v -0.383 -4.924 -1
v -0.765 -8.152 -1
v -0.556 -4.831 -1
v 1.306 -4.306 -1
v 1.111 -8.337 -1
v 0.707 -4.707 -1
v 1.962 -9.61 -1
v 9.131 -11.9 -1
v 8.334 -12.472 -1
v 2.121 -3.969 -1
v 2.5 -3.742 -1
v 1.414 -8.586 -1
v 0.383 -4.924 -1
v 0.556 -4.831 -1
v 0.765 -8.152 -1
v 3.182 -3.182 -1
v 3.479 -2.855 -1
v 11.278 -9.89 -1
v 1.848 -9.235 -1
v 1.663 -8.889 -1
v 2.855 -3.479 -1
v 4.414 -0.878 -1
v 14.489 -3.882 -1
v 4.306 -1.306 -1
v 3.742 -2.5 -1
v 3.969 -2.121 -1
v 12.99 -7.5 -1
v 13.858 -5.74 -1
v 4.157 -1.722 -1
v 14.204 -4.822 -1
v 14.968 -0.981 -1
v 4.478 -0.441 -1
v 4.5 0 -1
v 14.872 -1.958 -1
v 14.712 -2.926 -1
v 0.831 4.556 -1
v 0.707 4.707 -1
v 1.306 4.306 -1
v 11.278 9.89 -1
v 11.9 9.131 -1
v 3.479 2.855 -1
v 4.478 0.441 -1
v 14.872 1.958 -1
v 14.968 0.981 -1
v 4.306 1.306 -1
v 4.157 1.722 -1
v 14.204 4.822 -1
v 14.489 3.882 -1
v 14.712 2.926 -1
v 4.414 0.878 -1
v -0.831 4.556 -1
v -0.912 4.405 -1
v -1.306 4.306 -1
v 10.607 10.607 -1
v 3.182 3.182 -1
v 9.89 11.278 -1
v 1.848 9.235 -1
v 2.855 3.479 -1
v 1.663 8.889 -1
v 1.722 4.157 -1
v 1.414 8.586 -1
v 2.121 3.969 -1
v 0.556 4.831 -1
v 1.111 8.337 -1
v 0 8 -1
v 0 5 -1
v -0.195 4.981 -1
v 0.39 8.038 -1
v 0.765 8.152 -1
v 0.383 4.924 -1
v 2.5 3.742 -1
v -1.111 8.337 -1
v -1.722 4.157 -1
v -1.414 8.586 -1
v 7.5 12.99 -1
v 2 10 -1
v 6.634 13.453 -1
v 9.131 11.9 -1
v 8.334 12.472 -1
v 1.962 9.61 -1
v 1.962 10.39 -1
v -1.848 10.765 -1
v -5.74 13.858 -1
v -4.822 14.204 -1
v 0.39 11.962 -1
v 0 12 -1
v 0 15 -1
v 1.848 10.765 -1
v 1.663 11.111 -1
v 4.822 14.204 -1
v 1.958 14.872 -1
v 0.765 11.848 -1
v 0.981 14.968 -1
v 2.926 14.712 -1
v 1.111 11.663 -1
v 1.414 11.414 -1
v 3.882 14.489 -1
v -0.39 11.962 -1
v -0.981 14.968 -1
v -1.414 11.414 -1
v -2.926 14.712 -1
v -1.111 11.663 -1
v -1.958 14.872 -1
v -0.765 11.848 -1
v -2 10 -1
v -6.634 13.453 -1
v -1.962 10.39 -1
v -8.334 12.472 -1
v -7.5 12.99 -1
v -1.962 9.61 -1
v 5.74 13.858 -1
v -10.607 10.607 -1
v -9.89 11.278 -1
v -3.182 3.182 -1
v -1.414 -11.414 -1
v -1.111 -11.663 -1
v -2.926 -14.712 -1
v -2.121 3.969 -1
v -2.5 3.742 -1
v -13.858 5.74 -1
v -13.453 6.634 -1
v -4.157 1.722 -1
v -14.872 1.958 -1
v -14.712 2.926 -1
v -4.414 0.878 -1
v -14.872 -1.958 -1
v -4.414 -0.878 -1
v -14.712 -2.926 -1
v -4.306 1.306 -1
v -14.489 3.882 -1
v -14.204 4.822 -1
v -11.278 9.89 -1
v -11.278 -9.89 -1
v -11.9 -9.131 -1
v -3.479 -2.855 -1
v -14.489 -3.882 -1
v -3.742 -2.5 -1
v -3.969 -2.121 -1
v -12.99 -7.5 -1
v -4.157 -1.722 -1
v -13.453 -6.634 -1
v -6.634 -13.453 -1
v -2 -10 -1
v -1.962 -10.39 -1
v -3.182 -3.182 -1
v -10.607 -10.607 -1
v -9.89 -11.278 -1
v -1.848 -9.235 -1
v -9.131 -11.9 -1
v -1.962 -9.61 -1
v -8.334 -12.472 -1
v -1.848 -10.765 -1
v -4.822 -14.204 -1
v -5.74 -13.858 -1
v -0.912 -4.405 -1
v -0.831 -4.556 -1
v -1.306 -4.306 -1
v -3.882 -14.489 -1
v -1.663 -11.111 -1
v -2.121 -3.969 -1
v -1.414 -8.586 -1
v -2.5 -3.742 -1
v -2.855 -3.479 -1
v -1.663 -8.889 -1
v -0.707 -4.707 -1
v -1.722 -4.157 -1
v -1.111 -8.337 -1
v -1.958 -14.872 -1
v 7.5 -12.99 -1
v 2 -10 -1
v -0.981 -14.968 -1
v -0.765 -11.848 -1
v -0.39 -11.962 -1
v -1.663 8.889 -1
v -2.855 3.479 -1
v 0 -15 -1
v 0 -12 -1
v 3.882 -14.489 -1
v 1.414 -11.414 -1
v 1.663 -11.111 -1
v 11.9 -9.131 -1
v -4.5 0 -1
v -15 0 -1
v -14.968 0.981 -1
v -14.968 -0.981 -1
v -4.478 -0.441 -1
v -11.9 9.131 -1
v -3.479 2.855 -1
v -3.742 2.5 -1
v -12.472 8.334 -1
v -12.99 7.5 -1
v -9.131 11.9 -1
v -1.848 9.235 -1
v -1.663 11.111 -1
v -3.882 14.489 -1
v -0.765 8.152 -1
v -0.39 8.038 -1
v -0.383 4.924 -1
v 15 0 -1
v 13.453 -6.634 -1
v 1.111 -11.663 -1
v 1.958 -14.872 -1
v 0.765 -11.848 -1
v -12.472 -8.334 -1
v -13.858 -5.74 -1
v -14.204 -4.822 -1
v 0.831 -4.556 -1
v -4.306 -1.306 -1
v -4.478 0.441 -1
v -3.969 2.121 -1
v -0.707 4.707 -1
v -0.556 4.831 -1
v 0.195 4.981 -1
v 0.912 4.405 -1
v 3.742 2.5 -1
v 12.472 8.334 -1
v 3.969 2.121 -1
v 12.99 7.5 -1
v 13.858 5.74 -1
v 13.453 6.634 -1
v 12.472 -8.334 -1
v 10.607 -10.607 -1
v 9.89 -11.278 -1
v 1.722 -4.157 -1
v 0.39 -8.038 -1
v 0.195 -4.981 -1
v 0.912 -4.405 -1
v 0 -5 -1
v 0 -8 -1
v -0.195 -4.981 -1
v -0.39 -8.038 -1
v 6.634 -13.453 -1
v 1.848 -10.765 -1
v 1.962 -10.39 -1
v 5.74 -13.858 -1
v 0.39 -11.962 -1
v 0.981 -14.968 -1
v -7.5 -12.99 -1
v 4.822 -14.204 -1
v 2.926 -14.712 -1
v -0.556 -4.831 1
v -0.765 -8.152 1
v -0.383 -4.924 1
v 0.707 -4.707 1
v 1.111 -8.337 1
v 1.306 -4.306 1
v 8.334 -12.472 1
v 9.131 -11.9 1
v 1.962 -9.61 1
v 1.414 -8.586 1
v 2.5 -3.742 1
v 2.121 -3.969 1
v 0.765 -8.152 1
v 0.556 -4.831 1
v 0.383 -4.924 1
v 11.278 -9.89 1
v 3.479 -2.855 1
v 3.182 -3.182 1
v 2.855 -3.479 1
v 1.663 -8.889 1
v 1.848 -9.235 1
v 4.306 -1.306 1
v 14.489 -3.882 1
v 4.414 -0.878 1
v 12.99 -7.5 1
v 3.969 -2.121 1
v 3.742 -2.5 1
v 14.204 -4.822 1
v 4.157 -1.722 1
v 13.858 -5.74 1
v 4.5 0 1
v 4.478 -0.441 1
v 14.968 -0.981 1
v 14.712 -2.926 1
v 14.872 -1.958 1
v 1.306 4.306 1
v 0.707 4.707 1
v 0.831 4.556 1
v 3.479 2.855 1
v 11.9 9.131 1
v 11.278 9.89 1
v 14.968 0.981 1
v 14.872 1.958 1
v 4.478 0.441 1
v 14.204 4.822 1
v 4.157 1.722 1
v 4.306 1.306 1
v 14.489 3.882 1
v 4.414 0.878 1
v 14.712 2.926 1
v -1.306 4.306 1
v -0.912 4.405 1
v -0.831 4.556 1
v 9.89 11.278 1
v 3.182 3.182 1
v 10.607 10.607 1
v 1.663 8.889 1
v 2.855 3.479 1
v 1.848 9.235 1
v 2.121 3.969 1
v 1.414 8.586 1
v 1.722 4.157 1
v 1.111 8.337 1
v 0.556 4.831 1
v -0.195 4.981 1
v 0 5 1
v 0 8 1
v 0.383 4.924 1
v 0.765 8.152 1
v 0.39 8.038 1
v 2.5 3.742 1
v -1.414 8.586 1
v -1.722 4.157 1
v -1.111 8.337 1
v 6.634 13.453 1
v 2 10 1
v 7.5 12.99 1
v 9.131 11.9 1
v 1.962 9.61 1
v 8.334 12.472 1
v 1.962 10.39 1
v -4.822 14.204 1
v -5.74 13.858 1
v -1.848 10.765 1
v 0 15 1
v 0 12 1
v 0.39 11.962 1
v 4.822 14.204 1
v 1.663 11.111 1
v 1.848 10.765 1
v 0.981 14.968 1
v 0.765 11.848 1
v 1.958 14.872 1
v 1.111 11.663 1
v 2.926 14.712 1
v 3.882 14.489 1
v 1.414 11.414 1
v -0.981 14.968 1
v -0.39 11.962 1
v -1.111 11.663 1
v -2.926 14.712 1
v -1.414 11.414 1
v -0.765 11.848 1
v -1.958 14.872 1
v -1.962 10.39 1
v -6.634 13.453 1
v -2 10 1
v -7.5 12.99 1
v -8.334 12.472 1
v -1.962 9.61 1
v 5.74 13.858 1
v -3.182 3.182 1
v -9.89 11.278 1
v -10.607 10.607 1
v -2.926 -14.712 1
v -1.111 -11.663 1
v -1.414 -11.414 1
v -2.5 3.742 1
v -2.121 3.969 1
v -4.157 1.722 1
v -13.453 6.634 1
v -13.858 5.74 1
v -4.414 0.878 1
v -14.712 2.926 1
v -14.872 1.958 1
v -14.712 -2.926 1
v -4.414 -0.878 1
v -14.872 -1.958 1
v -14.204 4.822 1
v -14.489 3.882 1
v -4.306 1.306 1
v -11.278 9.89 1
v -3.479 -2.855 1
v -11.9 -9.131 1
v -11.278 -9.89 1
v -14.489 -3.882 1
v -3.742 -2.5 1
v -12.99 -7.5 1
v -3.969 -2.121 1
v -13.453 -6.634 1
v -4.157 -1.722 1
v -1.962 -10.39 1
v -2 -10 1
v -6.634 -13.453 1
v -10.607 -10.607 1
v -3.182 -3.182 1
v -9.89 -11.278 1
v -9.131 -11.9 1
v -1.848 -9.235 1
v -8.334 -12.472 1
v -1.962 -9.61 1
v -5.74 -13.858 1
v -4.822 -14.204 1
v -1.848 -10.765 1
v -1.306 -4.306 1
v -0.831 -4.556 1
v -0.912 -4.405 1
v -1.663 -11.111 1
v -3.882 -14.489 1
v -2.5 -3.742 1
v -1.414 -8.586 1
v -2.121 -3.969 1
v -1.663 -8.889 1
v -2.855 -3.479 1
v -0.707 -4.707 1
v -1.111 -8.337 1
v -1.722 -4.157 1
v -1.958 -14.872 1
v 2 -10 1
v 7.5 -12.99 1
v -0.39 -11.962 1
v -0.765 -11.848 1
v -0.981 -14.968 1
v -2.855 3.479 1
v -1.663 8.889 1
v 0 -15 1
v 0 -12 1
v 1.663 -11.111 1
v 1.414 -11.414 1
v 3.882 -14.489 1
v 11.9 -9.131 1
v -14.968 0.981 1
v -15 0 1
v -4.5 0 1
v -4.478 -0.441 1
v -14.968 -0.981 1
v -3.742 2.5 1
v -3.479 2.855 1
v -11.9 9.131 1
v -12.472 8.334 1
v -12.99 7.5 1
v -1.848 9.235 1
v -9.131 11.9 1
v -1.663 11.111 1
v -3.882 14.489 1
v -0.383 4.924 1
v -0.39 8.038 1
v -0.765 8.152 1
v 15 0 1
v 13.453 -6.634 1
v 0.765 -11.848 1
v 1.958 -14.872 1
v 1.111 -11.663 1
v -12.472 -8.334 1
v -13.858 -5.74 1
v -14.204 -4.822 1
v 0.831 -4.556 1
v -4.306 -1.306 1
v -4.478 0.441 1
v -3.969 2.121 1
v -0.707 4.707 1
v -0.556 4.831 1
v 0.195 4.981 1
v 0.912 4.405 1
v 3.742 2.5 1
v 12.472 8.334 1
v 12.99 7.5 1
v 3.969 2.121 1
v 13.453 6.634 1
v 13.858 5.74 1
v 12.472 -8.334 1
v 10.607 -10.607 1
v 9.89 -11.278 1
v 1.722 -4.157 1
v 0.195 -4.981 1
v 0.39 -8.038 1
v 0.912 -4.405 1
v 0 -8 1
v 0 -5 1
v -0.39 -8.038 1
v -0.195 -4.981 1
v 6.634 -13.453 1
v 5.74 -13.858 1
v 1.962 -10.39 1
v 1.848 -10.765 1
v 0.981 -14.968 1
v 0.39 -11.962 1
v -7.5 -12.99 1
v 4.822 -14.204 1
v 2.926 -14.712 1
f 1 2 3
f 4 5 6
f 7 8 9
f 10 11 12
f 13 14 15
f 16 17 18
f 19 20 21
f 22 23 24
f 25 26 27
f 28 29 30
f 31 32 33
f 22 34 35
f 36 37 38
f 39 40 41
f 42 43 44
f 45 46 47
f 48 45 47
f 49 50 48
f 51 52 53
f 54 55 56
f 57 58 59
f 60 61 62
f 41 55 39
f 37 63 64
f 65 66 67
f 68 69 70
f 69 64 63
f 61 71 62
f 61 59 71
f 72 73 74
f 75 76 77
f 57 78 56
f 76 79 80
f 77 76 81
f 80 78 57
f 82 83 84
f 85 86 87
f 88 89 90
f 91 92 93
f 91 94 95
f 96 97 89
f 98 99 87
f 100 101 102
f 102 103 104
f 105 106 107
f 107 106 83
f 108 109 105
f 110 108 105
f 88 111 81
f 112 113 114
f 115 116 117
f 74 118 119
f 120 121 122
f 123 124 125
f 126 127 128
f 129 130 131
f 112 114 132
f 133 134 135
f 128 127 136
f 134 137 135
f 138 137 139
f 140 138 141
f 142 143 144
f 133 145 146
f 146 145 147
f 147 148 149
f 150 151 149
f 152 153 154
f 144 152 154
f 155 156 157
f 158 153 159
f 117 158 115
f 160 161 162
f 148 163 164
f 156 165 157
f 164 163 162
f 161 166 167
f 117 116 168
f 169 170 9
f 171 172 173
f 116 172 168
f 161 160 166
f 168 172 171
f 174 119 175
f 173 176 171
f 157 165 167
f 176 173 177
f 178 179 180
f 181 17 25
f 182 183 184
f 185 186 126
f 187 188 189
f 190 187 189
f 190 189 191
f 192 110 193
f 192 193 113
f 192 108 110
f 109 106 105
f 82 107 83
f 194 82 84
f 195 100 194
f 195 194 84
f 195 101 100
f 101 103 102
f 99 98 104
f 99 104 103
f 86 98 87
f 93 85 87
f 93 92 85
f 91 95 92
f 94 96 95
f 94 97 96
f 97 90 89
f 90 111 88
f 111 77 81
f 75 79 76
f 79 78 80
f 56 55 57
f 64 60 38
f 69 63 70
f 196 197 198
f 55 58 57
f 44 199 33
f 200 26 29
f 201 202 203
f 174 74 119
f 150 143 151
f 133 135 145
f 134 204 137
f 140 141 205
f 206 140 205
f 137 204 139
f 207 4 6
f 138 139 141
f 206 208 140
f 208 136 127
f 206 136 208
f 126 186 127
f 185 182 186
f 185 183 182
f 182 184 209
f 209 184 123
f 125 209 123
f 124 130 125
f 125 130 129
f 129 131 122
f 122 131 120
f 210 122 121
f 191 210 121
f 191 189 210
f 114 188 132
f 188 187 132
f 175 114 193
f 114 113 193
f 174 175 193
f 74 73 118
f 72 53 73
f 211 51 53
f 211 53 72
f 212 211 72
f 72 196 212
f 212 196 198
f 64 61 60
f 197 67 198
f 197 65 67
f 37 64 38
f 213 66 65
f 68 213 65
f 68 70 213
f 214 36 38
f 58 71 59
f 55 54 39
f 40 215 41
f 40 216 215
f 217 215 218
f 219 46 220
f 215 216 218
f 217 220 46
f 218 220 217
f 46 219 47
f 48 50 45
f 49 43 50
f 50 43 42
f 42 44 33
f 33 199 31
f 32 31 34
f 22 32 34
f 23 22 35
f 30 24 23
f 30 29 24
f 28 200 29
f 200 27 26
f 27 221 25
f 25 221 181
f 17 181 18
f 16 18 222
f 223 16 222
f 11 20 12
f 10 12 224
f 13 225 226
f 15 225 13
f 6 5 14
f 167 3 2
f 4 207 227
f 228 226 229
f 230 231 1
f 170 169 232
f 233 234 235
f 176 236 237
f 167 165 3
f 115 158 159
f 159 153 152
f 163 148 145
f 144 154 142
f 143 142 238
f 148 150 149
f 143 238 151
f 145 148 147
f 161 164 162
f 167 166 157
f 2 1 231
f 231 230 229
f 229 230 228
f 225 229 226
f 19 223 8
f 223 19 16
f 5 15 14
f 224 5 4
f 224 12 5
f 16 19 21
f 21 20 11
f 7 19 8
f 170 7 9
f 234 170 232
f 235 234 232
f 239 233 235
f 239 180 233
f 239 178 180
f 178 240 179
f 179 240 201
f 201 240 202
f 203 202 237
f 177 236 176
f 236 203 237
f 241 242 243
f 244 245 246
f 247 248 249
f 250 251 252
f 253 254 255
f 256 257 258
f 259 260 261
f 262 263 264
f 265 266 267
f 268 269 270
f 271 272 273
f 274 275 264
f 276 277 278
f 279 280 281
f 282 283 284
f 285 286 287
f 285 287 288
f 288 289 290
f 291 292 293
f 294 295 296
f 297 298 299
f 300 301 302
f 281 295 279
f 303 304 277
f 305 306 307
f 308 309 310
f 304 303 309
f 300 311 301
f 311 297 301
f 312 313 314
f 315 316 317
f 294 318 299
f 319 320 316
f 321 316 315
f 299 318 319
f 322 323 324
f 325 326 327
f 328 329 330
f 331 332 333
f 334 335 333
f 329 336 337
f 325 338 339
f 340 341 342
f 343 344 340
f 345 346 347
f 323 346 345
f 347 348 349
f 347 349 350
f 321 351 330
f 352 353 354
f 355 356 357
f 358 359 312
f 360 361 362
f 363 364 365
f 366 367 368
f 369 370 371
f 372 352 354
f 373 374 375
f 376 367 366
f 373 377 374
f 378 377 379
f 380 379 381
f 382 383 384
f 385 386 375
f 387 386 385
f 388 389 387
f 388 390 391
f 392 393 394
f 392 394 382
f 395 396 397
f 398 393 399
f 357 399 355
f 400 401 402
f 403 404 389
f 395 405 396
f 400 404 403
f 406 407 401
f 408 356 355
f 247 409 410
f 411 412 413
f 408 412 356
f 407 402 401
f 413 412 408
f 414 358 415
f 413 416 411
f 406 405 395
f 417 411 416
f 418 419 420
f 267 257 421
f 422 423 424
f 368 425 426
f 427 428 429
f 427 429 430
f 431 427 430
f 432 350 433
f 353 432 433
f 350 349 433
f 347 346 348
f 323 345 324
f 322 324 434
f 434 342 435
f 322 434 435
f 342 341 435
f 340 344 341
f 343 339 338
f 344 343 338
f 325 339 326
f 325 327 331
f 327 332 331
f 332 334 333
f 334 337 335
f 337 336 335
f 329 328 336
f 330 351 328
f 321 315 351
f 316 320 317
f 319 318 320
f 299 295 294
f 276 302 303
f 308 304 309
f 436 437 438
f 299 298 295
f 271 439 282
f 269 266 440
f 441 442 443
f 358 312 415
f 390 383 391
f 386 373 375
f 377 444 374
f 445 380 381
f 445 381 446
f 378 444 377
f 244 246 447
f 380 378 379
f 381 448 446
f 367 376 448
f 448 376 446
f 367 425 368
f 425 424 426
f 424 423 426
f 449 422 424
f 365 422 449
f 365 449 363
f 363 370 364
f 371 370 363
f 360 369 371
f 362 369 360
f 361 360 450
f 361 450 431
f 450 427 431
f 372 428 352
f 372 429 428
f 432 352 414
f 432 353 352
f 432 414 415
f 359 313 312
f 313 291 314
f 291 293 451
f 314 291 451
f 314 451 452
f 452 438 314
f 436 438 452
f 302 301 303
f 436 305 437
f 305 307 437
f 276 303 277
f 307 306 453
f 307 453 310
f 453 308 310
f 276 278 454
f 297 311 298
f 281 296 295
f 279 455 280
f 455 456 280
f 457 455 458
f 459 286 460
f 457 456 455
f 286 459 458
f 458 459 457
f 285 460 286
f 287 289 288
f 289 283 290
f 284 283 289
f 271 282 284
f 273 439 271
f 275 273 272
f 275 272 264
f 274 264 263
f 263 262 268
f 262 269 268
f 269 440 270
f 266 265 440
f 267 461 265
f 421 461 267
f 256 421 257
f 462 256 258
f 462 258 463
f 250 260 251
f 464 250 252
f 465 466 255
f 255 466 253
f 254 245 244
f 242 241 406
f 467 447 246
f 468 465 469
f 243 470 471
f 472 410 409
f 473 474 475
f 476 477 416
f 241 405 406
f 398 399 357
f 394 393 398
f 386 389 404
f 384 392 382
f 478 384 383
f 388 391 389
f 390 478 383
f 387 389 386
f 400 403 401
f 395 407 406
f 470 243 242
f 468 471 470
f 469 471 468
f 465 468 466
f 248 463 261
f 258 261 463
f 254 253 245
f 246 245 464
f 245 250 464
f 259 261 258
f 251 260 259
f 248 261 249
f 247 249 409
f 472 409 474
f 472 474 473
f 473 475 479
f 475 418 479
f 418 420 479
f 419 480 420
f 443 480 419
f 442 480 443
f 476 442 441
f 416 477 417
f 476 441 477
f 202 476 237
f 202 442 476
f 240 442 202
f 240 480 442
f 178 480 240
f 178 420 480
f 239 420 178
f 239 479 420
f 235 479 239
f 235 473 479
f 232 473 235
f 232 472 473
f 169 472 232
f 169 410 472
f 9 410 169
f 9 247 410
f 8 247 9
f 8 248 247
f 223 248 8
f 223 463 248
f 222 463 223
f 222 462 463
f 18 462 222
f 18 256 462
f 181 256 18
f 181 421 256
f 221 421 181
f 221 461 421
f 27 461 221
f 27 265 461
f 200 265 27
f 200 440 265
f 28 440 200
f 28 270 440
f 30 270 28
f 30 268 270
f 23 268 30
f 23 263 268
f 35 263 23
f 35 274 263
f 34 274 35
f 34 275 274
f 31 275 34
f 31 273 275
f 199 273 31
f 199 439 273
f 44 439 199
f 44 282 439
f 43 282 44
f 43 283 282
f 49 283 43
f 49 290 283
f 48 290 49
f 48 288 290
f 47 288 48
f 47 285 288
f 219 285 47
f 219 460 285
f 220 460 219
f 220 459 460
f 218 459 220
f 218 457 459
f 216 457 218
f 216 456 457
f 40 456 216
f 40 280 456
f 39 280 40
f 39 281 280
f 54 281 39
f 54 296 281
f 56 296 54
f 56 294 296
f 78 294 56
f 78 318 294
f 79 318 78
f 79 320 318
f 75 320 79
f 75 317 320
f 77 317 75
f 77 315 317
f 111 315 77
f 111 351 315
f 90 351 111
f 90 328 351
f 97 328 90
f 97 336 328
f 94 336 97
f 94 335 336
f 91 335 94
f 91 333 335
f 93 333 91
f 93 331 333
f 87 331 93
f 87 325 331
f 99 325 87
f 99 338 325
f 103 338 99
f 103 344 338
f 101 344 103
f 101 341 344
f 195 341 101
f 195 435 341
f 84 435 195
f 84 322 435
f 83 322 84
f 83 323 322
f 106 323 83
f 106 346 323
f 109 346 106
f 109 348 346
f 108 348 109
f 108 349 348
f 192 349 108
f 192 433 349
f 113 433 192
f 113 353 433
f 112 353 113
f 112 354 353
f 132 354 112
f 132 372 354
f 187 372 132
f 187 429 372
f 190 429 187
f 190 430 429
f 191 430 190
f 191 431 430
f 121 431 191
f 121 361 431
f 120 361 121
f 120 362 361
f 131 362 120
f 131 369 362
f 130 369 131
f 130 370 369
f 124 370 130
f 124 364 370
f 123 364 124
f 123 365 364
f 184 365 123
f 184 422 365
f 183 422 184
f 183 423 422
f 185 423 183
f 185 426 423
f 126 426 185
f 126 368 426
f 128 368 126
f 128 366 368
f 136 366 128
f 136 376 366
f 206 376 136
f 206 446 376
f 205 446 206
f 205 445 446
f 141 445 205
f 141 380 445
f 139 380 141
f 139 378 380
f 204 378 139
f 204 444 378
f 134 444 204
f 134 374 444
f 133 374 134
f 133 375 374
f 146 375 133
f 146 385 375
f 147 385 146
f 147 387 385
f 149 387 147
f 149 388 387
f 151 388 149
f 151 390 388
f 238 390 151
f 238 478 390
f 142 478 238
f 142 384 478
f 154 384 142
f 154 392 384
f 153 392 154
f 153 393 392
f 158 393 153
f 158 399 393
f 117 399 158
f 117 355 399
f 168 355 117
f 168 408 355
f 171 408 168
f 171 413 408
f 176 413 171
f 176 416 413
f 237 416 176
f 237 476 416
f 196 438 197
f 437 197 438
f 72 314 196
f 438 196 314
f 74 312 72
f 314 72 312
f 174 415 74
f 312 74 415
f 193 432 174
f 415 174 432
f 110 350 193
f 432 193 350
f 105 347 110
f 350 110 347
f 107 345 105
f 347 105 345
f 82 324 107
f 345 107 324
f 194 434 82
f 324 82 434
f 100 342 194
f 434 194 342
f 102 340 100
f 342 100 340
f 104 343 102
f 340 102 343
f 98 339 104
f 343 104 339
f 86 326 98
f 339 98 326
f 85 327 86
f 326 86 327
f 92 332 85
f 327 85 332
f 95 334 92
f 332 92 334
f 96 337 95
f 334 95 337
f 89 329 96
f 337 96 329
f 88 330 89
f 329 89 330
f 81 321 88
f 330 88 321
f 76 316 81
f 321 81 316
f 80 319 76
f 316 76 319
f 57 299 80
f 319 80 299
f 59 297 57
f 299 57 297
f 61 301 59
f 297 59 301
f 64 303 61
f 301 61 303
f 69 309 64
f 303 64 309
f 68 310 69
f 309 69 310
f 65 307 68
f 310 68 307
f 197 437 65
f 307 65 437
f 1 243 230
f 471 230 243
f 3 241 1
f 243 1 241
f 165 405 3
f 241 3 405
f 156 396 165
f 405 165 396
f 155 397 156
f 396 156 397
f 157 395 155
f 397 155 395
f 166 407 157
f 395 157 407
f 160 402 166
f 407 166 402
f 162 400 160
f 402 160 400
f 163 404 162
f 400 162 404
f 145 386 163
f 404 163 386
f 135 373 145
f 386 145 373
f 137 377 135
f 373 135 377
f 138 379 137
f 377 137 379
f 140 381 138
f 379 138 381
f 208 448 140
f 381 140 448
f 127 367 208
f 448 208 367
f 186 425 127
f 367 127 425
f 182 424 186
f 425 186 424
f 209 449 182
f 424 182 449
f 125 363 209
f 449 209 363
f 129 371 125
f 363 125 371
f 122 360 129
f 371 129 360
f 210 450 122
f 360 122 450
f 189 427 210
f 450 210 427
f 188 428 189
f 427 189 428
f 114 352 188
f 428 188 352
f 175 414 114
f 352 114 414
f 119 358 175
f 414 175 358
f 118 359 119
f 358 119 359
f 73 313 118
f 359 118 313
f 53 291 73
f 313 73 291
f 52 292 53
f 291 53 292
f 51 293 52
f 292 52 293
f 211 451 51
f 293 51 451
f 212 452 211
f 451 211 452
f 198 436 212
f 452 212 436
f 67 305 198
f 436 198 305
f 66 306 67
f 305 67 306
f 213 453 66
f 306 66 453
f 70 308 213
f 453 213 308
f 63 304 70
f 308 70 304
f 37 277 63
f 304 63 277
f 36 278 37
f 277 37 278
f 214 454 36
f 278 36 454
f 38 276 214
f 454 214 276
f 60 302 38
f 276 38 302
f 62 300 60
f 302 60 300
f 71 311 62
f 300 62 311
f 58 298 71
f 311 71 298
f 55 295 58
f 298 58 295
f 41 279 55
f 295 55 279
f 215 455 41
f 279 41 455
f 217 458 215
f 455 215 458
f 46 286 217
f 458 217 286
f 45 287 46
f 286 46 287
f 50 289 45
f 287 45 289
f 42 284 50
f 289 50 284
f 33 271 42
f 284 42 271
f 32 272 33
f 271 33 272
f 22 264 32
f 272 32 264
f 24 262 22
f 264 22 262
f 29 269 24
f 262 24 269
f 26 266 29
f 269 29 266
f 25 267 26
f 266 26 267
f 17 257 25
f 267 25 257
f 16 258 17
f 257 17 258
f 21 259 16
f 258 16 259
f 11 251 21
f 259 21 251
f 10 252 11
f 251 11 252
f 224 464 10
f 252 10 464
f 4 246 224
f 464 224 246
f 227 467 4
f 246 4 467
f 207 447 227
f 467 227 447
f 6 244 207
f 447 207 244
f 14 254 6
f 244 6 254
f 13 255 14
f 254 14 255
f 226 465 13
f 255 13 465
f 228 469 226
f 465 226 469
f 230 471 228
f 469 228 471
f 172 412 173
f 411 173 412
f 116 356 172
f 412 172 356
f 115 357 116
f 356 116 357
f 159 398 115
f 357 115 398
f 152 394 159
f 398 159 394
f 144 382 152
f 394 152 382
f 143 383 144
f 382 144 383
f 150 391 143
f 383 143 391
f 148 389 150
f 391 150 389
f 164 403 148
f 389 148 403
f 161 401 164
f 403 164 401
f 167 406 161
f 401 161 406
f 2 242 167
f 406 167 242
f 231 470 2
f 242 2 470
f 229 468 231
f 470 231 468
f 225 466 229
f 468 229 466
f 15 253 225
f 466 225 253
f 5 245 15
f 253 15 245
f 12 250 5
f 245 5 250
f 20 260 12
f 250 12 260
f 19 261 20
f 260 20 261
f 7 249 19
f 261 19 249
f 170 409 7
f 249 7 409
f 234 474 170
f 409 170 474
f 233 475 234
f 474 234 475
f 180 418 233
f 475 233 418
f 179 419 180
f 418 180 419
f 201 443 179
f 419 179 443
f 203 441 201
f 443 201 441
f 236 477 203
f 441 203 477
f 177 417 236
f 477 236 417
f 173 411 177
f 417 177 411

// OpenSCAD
// part_id: b10
// name: B10 disc plate
// source_drawing_ids: DRW-002
// units: mm
// revision: 0.1
// SPDX-License-Identifier: MIT

module b10_center_bore_2d(
    center_r = 4.5,
    lobe_r = 1.0,
    lobe_offset = 4.0
) {
    union() {
        circle(r = center_r, $fn = 64);
        for (sy = [-1, 1])
            translate([0, sy * lobe_offset])
                circle(r = lobe_r, $fn = 32);
    }
}

module b10_profile_2d(
    od = 30,
    center_r = 4.5,
    lobe_r = 1.0,
    lobe_offset = 4.0,
    hole_d = 4,
    hole_pitch = 20
) {
    difference() {
        circle(d = od, $fn = 96);
        b10_center_bore_2d(center_r = center_r, lobe_r = lobe_r, lobe_offset = lobe_offset);
        for (a = [90, 270])
            rotate(a) translate([hole_pitch / 2, 0]) circle(d = hole_d, $fn = 32);
    }
}

module part_b10(od = 30, thickness = 2.0) {
    translate([0, 0, -thickness / 2])
        linear_extrude(height = thickness)
            b10_profile_2d(od = od);
}

// ---- "main guard" ----
// Default to previewing when opened directly:
if (is_undef(__LIB_MODE__)) {
    part_b10();
}
